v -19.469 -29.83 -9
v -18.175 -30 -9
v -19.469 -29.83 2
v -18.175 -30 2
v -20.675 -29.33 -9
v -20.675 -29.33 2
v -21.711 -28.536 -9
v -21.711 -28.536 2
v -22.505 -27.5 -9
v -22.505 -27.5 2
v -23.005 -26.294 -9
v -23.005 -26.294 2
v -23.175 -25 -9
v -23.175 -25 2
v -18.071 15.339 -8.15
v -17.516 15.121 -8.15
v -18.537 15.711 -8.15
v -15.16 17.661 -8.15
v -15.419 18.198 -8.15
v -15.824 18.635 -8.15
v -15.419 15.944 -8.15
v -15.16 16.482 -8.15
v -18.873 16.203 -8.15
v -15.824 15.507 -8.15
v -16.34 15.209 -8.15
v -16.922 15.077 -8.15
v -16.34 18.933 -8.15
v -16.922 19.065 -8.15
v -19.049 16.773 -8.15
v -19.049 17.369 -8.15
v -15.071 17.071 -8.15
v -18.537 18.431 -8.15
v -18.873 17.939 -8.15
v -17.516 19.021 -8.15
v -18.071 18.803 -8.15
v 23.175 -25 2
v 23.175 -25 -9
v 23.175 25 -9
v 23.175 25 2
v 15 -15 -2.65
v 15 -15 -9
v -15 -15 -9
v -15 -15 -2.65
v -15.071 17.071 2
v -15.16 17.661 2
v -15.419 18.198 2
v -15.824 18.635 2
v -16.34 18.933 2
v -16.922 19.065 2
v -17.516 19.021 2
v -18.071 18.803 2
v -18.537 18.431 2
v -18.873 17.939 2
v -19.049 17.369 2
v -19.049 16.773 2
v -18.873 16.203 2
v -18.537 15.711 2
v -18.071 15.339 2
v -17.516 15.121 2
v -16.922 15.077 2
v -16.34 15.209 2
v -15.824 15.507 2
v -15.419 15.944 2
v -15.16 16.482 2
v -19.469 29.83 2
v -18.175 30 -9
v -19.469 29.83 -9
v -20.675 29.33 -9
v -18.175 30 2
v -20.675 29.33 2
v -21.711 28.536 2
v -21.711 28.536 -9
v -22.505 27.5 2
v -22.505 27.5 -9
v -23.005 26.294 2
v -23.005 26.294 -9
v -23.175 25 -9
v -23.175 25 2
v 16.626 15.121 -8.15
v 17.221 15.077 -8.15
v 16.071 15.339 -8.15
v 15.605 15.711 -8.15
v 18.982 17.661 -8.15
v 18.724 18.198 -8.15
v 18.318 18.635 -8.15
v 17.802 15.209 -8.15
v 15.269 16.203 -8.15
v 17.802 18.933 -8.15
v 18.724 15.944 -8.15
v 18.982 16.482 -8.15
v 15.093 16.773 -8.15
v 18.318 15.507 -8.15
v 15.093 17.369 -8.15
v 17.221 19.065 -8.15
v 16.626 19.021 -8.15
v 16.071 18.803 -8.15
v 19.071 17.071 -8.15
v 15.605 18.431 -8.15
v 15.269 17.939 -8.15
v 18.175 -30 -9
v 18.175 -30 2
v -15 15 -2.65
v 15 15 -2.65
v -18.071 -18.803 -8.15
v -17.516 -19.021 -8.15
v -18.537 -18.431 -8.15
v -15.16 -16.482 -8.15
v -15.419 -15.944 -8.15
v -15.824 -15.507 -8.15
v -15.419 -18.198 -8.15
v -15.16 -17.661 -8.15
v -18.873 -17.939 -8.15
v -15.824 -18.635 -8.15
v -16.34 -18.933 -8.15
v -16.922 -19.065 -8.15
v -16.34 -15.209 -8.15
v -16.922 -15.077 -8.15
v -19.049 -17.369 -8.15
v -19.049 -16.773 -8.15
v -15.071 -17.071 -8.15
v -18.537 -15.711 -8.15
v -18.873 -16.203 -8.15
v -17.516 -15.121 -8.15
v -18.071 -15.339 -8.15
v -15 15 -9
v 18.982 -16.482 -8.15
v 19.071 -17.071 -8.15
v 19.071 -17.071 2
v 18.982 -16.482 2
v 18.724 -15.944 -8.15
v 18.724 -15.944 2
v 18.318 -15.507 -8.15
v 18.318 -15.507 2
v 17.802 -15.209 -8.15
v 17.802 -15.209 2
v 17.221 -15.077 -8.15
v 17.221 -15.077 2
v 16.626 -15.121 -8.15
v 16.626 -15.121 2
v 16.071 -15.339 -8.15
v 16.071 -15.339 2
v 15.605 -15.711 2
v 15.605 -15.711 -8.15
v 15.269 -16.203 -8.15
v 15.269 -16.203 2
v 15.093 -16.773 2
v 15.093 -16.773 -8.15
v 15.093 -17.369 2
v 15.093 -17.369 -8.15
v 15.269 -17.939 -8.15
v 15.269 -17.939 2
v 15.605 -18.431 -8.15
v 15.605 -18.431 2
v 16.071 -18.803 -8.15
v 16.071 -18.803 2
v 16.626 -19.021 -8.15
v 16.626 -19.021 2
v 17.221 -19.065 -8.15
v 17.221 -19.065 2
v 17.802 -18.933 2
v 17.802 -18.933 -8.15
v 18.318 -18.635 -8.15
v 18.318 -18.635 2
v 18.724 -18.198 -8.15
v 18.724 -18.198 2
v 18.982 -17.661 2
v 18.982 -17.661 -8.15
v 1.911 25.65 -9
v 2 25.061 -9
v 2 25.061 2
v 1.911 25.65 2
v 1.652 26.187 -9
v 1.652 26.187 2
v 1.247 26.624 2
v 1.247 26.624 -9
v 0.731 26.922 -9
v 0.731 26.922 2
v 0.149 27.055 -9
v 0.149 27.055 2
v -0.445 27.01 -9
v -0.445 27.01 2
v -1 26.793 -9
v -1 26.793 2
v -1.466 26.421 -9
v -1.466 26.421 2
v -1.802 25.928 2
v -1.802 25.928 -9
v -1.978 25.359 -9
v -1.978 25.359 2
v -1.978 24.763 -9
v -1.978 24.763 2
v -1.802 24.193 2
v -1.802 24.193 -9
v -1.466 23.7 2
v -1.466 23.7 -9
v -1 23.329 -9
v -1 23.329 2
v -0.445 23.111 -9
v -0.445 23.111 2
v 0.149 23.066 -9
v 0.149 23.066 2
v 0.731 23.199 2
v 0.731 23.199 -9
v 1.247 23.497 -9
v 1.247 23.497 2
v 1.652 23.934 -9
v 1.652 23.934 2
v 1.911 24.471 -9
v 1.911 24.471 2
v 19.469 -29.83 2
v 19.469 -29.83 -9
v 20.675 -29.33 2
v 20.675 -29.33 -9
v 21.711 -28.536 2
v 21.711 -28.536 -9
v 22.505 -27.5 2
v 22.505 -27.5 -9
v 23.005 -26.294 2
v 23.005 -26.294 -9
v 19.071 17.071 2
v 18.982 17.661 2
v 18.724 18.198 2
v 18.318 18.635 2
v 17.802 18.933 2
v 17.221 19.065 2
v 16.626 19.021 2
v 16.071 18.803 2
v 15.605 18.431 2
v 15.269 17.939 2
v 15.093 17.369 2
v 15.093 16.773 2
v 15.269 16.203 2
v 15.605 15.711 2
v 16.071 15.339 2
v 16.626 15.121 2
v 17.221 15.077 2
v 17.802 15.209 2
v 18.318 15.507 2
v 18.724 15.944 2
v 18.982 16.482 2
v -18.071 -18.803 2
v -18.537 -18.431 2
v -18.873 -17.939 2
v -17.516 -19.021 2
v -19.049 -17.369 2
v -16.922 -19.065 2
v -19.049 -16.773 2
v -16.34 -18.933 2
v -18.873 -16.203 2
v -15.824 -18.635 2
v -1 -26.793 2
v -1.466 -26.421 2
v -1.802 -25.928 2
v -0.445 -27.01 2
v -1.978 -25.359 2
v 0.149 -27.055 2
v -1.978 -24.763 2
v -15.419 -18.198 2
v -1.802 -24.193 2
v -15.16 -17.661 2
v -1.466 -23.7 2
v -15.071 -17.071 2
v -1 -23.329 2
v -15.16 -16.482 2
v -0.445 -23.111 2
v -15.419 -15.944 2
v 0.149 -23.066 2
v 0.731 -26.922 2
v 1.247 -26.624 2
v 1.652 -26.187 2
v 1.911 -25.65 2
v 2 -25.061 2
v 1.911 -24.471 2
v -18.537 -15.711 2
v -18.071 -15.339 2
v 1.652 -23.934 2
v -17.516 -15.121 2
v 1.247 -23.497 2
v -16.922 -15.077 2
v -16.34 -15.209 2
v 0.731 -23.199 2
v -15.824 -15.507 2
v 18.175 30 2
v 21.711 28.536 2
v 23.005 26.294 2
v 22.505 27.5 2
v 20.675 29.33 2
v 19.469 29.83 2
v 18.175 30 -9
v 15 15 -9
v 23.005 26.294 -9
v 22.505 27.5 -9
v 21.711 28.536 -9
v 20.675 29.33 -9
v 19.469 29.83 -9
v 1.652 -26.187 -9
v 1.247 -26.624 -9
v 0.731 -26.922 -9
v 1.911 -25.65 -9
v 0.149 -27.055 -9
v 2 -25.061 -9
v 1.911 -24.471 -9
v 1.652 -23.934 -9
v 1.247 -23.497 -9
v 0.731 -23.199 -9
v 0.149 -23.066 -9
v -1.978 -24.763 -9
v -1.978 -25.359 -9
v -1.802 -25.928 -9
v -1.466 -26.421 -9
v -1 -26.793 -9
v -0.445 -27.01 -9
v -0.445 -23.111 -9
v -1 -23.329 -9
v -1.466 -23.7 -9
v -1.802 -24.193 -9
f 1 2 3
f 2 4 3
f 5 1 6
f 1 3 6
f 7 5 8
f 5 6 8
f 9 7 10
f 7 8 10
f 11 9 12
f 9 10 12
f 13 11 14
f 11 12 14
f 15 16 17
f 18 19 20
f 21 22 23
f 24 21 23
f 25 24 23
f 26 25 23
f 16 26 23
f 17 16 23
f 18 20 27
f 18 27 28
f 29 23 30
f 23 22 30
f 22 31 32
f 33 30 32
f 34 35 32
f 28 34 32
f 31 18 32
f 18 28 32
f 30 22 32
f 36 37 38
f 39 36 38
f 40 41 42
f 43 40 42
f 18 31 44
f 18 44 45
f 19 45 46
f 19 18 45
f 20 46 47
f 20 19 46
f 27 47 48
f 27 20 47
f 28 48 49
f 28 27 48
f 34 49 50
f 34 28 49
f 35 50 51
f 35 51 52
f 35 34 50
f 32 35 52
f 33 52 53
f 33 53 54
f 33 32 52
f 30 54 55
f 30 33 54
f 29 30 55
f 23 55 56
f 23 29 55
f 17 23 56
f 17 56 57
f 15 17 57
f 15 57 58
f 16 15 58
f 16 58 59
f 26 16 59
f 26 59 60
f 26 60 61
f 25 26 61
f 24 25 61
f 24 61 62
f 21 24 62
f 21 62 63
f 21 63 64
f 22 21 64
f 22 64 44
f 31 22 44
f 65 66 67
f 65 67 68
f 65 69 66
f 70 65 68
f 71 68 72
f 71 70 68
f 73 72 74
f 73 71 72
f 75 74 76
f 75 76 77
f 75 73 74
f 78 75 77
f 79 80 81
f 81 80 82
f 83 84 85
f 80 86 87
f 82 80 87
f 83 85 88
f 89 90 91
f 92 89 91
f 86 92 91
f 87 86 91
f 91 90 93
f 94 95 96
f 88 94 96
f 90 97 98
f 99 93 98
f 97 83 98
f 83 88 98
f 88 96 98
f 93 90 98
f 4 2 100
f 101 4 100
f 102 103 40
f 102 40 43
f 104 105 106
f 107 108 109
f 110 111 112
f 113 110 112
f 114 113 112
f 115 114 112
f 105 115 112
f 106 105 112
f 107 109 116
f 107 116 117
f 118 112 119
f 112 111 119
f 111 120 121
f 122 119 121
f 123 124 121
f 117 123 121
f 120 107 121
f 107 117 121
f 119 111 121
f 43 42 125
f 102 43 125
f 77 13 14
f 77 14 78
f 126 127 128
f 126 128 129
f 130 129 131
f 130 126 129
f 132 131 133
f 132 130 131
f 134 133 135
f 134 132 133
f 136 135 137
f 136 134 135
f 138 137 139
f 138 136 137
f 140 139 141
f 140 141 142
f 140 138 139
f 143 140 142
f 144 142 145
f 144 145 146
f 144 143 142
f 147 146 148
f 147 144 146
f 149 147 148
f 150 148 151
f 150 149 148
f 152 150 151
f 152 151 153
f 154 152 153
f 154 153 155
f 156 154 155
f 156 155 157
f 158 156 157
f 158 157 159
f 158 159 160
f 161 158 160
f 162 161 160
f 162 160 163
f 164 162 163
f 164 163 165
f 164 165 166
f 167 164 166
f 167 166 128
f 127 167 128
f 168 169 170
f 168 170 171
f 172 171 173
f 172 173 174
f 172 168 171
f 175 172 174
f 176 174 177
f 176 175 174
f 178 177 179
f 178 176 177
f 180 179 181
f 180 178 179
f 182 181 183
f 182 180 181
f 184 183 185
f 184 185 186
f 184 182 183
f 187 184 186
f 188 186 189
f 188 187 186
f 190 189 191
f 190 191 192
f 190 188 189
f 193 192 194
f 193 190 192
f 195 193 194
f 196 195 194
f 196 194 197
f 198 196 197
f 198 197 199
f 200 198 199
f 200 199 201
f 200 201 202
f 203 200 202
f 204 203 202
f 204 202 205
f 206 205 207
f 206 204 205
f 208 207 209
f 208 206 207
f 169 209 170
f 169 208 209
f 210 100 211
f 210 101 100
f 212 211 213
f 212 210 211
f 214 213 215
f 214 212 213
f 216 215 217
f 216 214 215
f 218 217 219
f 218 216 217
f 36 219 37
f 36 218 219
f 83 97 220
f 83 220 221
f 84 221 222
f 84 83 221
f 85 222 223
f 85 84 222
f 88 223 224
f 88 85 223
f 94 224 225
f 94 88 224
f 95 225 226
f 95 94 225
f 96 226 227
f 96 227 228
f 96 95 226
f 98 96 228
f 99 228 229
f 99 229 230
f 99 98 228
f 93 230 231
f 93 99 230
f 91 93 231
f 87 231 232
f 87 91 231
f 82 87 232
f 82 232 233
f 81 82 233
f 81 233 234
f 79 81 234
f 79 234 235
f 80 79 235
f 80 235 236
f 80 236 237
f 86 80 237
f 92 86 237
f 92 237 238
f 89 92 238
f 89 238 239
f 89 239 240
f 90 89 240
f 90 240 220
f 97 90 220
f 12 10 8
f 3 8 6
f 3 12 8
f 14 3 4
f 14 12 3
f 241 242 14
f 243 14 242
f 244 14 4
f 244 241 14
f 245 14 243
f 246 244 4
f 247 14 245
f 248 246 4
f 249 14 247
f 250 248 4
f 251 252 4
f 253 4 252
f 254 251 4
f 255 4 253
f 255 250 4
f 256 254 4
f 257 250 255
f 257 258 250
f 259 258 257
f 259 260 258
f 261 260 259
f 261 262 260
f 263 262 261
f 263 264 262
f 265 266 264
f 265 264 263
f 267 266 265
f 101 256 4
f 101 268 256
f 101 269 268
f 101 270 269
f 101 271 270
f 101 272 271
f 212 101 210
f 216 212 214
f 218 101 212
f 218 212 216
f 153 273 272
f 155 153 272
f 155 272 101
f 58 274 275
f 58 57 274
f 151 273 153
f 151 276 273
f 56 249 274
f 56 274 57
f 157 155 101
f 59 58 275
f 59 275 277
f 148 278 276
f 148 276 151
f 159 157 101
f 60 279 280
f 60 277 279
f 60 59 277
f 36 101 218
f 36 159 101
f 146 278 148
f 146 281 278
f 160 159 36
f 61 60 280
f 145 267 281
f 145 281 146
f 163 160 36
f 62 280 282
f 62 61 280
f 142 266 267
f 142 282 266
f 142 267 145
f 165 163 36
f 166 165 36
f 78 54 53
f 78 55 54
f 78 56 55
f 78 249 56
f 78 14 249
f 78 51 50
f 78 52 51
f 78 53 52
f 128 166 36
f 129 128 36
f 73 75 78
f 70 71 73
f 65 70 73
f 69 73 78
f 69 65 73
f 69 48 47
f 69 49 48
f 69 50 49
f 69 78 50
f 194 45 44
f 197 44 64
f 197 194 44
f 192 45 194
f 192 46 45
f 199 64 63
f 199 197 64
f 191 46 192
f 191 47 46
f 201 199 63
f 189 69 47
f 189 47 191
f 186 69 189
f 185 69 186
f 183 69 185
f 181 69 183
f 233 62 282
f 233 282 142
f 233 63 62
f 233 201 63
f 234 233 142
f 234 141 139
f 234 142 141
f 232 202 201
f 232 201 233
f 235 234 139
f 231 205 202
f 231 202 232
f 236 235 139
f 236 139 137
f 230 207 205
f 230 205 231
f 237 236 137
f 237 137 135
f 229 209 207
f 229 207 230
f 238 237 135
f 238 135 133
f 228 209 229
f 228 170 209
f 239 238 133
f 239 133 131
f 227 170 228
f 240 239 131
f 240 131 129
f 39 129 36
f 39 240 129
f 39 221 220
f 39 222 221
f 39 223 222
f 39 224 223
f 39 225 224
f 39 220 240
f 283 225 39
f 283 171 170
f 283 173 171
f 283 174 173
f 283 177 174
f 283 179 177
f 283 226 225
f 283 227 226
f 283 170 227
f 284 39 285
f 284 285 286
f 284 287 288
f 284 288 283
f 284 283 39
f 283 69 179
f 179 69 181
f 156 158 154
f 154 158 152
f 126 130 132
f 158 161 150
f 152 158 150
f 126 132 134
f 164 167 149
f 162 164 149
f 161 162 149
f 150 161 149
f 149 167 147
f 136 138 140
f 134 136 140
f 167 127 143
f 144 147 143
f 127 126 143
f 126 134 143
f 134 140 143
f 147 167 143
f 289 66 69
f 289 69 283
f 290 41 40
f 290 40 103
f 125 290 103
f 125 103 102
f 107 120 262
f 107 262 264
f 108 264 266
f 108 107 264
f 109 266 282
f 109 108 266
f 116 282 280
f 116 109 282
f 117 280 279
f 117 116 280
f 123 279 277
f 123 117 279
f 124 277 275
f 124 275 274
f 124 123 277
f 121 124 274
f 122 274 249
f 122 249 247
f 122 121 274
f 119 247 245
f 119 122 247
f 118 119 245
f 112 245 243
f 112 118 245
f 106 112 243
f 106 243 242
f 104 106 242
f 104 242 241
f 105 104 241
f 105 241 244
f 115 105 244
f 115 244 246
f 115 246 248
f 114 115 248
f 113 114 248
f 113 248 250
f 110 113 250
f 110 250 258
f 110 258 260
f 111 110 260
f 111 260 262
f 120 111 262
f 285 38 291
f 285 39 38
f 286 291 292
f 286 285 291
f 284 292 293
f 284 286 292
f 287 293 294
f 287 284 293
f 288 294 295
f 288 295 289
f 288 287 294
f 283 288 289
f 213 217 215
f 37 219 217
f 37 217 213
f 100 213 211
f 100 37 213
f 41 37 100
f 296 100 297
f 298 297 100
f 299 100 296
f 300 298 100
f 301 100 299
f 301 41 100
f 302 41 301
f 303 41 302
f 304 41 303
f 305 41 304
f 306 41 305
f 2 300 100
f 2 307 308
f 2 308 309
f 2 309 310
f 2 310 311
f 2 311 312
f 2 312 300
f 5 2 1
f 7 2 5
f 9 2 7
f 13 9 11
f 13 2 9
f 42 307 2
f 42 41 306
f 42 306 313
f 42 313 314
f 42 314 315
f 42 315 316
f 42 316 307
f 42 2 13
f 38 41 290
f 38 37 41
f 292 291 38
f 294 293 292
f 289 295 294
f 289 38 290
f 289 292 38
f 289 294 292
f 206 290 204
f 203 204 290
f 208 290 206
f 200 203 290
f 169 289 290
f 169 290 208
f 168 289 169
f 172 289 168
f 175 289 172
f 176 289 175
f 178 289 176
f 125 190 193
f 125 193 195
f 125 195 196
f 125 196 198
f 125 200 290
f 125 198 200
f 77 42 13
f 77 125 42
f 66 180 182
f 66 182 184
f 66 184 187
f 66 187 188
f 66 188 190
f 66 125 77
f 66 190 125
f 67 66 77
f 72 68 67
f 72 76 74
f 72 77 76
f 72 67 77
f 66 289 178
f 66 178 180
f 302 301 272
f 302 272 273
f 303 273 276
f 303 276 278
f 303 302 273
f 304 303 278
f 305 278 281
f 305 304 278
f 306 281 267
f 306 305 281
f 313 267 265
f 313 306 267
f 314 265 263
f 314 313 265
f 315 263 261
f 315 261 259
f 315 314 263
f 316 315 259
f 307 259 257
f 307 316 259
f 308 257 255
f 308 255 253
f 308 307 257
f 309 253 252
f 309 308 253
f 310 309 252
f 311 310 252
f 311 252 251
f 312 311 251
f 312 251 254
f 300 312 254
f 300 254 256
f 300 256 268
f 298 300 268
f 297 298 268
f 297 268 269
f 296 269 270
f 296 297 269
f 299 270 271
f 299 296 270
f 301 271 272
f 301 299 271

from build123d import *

# Parameters (mm, degrees)
BOSS_EXTRUDE1_DEPTH      = 2
BOSS_EXTRUDE1_DEPTH_BACK = 9
SKETCH1_W                = 46.35
SKETCH1_H                = 60
SKETCH1_R                = 2
SKETCH2_W                = 30
SKETCH2_H                = 30
CUT_EXTRUDE1_DEPTH       = 6.35
SKETCH4_R                = 2
BOSS_EXTRUDE4_DEPTH      = 0.85
FILLET1_R                = 5


with BuildPart() as part:
    # Sketch1 → Boss-Extrude1 (new, two sides: drawn at the far end of the back side and taken through both)
    with BuildSketch(Plane.XY.offset(-BOSS_EXTRUDE1_DEPTH_BACK)):
        Rectangle(SKETCH1_W, SKETCH1_H)
        with Locations((-17.071067812, 17.071067812)):
            Circle(SKETCH1_R, mode=Mode.SUBTRACT)
        with Locations((-17.071067812, -17.071067812)):
            Circle(SKETCH1_R, mode=Mode.SUBTRACT)
        with Locations((17.071067812, -17.071067812)):
            Circle(SKETCH1_R, mode=Mode.SUBTRACT)
        with Locations((17.071067812, 17.071067812)):
            Circle(SKETCH1_R, mode=Mode.SUBTRACT)
        with Locations((0, 25.060622825)):
            Circle(SKETCH1_R, mode=Mode.SUBTRACT)
        with Locations((0, -25.060622825)):
            Circle(SKETCH1_R, mode=Mode.SUBTRACT)
    extrude(amount=BOSS_EXTRUDE1_DEPTH + BOSS_EXTRUDE1_DEPTH_BACK)

    # Sketch2 → Cut-Extrude1 (cut)
    with BuildSketch(Plane(origin=(0, 0, -9), x_dir=(-1, 0, 0), z_dir=(0, 0, -1))):
        Rectangle(SKETCH2_W, SKETCH2_H)
    extrude(amount=-CUT_EXTRUDE1_DEPTH, mode=Mode.SUBTRACT)

    # Sketch4 → Boss-Extrude4 (add)
    with BuildSketch(Plane(origin=(0, 0, -9), x_dir=(-1, 0, 0), z_dir=(0, 0, -1))):
        with Locations((-17.071067812, 17.071067812)):
            Circle(SKETCH4_R)
        with Locations((17.071067812, 17.071067812)):
            Circle(SKETCH4_R)
        with Locations((-17.071067812, -17.071067812)):
            Circle(SKETCH4_R)
        with Locations((17.071067812, -17.071067812)):
            Circle(SKETCH4_R)
    extrude(amount=-BOSS_EXTRUDE4_DEPTH)

    # Fillet1
    fillet1_edges = [part.edges().sort_by_distance(p)[0] for p in [
        (-23.175, -30, -3.5),
        (-23.175, 30, -3.5),
        (23.175, 30, -3.5),
        (23.175, -30, -3.5),
    ]]
    fillet(fillet1_edges, radius=FILLET1_R)


solid = part.part
